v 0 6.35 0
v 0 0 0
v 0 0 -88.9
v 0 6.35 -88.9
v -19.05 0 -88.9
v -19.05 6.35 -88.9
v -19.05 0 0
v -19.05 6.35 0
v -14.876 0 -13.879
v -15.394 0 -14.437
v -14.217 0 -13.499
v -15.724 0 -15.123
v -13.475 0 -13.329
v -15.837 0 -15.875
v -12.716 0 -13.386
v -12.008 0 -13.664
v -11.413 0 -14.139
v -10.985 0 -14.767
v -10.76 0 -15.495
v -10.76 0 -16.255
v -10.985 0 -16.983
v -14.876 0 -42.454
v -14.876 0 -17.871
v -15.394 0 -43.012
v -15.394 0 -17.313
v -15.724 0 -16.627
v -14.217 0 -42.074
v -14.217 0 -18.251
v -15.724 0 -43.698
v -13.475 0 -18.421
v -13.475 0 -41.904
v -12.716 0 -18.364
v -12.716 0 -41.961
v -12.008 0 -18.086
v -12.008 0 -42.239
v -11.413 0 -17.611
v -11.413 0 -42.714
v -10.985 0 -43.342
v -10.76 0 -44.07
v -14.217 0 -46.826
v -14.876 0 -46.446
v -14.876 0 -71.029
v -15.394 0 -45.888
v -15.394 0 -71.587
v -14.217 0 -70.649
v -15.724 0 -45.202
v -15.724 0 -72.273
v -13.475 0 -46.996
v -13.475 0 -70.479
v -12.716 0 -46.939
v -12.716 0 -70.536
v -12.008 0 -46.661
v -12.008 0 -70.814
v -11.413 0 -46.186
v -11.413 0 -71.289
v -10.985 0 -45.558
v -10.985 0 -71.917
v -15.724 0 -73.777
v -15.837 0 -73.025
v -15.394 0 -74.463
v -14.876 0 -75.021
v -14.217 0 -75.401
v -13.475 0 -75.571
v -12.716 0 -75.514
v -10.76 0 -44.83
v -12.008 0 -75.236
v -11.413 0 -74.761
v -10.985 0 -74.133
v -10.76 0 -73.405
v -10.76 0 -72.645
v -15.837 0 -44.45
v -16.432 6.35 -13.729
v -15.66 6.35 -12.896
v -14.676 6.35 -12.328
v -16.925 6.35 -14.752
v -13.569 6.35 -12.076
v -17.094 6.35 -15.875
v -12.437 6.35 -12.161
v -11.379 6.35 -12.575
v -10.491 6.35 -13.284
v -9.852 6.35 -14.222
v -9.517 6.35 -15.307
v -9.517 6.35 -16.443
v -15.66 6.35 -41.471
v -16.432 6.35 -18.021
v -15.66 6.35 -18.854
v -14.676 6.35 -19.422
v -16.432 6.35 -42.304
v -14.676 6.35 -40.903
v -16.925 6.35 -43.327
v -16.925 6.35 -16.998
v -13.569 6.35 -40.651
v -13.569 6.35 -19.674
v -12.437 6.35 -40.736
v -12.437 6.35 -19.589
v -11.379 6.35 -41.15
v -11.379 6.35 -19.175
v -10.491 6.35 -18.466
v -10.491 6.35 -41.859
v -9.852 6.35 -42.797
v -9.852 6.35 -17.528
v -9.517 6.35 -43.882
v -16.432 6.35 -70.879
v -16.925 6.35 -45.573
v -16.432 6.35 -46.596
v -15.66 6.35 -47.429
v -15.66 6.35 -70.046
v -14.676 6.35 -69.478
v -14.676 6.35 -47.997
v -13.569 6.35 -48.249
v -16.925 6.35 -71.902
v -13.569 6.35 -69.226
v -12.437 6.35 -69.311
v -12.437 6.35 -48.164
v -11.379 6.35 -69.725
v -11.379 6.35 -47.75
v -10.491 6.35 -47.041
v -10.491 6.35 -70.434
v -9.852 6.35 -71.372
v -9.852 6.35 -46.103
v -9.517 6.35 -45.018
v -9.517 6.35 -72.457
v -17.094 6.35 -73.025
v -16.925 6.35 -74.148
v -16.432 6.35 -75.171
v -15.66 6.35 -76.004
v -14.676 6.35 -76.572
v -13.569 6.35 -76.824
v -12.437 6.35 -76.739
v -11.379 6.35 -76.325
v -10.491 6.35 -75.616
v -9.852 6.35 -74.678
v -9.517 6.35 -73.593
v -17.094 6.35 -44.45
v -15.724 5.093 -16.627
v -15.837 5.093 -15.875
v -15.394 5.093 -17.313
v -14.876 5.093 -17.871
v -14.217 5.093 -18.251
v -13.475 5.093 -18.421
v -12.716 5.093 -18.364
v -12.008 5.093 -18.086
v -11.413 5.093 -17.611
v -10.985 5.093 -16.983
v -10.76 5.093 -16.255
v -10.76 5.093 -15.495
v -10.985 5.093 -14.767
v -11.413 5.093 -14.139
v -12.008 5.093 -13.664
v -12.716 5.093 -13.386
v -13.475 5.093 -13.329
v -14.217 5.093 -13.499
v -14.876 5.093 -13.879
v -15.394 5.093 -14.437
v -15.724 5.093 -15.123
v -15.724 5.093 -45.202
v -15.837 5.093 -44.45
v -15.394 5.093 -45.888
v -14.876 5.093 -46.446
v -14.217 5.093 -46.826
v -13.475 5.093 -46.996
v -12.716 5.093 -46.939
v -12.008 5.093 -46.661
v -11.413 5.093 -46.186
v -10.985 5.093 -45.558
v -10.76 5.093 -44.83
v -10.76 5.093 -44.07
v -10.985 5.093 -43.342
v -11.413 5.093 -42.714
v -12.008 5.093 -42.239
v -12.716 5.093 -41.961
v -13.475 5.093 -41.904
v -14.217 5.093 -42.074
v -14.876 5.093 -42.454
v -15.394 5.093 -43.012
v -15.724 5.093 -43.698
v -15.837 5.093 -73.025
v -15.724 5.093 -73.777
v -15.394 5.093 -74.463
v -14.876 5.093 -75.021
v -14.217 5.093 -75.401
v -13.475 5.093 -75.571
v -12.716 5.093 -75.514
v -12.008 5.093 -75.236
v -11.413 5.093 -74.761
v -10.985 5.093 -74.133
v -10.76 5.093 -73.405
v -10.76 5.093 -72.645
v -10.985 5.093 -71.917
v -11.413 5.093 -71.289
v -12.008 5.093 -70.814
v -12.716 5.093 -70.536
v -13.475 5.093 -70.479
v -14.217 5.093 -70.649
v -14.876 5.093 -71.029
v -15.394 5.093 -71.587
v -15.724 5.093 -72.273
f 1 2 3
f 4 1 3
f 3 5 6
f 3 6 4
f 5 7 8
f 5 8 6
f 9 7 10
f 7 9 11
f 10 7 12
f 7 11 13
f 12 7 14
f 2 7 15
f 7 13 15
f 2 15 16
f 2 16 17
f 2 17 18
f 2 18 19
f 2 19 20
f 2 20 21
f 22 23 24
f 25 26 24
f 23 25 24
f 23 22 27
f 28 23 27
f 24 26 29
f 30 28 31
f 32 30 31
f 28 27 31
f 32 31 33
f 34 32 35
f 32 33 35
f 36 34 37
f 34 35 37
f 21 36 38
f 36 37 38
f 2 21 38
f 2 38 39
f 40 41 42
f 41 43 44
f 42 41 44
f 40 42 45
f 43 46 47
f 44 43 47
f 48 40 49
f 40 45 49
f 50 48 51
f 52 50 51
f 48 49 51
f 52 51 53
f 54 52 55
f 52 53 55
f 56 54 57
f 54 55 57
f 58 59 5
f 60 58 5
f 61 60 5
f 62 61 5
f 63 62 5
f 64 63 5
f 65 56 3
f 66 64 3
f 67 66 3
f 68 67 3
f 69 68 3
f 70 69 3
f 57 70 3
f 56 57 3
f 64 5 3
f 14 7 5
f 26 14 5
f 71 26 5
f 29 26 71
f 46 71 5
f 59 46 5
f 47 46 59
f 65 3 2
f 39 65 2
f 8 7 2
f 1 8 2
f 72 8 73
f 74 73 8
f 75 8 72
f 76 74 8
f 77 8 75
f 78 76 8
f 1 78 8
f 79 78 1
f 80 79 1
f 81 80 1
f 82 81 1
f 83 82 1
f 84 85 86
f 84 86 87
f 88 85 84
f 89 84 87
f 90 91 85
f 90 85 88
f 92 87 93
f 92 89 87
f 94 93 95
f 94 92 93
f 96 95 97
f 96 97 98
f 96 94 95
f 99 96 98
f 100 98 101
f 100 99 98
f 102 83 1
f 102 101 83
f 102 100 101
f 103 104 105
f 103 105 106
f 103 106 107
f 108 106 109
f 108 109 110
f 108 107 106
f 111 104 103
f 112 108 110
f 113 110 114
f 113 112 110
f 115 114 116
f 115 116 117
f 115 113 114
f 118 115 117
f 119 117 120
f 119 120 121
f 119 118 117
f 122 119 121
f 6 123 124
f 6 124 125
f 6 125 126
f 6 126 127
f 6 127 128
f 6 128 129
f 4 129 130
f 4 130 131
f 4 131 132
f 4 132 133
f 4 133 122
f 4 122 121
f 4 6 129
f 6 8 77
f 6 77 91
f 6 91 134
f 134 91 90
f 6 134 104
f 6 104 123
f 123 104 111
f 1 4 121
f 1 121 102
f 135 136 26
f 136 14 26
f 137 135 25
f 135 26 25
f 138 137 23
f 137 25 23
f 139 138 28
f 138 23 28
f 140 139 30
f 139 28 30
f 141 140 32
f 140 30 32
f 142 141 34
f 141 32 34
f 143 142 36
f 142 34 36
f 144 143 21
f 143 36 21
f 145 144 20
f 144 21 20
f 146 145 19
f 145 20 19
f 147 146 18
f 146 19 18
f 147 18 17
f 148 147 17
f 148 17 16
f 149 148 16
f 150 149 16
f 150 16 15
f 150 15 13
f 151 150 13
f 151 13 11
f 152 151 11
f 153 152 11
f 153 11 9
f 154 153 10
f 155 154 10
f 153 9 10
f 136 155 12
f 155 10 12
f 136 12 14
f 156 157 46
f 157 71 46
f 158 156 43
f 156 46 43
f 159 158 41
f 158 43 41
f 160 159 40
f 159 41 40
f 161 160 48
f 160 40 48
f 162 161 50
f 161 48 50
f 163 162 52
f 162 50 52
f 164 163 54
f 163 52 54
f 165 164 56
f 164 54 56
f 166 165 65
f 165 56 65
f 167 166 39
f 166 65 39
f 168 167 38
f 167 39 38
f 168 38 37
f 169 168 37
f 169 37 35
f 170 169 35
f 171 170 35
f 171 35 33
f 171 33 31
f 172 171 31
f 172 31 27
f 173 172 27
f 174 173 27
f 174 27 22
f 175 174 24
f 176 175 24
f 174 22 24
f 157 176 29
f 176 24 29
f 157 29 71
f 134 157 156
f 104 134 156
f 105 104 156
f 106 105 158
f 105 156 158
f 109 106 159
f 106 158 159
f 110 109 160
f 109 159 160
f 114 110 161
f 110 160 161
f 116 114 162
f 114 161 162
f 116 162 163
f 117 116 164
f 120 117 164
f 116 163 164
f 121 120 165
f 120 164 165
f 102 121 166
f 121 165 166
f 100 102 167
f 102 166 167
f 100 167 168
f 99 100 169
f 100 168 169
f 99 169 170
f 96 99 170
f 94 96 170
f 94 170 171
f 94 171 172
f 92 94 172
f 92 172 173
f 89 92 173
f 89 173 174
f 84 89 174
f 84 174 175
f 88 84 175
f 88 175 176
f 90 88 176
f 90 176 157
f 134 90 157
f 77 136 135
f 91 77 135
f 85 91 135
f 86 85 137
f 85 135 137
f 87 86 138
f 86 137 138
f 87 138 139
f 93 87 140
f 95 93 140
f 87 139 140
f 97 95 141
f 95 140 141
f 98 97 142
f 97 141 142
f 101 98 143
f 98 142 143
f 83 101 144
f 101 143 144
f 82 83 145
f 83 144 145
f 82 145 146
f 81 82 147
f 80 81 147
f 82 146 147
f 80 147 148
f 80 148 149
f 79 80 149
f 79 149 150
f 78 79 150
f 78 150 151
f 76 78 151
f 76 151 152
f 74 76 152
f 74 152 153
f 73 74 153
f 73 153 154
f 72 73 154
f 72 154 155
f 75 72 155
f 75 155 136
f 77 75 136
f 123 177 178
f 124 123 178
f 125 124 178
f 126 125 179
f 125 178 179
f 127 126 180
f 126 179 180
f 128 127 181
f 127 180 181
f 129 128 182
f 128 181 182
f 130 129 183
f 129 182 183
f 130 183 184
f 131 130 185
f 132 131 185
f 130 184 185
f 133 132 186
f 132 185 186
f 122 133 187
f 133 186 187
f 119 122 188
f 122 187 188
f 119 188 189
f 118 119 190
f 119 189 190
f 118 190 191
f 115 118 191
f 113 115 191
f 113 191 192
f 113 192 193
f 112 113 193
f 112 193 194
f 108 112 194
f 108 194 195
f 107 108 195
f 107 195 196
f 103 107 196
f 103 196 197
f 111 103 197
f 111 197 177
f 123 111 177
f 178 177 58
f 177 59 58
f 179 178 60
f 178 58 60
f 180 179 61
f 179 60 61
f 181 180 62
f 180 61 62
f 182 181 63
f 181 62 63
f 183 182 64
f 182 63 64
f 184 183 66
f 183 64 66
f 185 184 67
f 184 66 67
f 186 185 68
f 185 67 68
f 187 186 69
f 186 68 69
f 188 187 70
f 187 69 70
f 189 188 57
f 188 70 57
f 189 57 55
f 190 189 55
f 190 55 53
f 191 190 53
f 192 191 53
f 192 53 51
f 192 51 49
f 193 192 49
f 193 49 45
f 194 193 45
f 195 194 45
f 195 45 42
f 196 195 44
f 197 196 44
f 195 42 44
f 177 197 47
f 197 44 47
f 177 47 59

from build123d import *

# Parameters (mm, degrees)
SKETCH1_W                         = 19.05
SKETCH1_H                         = 88.9
BOSS_EXTRUDE1_DEPTH               = 6.35
F_1_4_20_TAPPED_HOLE1_D           = 5.1054
F_1_4_20_TAPPED_HOLE1_CSINK_D     = 7.62
F_1_4_20_TAPPED_HOLE1_CSINK_ANGLE = 90


with BuildPart() as part:
    # Sketch1 → Boss-Extrude1 (new body)
    with BuildSketch(Plane(origin=(0, 0, 0), x_dir=(1, 0, 0), z_dir=(0, 1, 0))):
        with Locations((-9.525, 44.45)):
            Rectangle(SKETCH1_W, SKETCH1_H)
    extrude(amount=BOSS_EXTRUDE1_DEPTH)

    # 1/4-20 Tapped Hole1 (through all)
    with Locations(Plane(origin=(0, 6.35, 0), x_dir=(1, 0, 0), z_dir=(0, 1, 0))):
        with Locations((-13.284419072, 15.875), (-13.284419072, 44.45), (-13.284419072, 73.025)):
            CounterSinkHole(F_1_4_20_TAPPED_HOLE1_D / 2, F_1_4_20_TAPPED_HOLE1_CSINK_D / 2, counter_sink_angle=F_1_4_20_TAPPED_HOLE1_CSINK_ANGLE)


solid = part.part
